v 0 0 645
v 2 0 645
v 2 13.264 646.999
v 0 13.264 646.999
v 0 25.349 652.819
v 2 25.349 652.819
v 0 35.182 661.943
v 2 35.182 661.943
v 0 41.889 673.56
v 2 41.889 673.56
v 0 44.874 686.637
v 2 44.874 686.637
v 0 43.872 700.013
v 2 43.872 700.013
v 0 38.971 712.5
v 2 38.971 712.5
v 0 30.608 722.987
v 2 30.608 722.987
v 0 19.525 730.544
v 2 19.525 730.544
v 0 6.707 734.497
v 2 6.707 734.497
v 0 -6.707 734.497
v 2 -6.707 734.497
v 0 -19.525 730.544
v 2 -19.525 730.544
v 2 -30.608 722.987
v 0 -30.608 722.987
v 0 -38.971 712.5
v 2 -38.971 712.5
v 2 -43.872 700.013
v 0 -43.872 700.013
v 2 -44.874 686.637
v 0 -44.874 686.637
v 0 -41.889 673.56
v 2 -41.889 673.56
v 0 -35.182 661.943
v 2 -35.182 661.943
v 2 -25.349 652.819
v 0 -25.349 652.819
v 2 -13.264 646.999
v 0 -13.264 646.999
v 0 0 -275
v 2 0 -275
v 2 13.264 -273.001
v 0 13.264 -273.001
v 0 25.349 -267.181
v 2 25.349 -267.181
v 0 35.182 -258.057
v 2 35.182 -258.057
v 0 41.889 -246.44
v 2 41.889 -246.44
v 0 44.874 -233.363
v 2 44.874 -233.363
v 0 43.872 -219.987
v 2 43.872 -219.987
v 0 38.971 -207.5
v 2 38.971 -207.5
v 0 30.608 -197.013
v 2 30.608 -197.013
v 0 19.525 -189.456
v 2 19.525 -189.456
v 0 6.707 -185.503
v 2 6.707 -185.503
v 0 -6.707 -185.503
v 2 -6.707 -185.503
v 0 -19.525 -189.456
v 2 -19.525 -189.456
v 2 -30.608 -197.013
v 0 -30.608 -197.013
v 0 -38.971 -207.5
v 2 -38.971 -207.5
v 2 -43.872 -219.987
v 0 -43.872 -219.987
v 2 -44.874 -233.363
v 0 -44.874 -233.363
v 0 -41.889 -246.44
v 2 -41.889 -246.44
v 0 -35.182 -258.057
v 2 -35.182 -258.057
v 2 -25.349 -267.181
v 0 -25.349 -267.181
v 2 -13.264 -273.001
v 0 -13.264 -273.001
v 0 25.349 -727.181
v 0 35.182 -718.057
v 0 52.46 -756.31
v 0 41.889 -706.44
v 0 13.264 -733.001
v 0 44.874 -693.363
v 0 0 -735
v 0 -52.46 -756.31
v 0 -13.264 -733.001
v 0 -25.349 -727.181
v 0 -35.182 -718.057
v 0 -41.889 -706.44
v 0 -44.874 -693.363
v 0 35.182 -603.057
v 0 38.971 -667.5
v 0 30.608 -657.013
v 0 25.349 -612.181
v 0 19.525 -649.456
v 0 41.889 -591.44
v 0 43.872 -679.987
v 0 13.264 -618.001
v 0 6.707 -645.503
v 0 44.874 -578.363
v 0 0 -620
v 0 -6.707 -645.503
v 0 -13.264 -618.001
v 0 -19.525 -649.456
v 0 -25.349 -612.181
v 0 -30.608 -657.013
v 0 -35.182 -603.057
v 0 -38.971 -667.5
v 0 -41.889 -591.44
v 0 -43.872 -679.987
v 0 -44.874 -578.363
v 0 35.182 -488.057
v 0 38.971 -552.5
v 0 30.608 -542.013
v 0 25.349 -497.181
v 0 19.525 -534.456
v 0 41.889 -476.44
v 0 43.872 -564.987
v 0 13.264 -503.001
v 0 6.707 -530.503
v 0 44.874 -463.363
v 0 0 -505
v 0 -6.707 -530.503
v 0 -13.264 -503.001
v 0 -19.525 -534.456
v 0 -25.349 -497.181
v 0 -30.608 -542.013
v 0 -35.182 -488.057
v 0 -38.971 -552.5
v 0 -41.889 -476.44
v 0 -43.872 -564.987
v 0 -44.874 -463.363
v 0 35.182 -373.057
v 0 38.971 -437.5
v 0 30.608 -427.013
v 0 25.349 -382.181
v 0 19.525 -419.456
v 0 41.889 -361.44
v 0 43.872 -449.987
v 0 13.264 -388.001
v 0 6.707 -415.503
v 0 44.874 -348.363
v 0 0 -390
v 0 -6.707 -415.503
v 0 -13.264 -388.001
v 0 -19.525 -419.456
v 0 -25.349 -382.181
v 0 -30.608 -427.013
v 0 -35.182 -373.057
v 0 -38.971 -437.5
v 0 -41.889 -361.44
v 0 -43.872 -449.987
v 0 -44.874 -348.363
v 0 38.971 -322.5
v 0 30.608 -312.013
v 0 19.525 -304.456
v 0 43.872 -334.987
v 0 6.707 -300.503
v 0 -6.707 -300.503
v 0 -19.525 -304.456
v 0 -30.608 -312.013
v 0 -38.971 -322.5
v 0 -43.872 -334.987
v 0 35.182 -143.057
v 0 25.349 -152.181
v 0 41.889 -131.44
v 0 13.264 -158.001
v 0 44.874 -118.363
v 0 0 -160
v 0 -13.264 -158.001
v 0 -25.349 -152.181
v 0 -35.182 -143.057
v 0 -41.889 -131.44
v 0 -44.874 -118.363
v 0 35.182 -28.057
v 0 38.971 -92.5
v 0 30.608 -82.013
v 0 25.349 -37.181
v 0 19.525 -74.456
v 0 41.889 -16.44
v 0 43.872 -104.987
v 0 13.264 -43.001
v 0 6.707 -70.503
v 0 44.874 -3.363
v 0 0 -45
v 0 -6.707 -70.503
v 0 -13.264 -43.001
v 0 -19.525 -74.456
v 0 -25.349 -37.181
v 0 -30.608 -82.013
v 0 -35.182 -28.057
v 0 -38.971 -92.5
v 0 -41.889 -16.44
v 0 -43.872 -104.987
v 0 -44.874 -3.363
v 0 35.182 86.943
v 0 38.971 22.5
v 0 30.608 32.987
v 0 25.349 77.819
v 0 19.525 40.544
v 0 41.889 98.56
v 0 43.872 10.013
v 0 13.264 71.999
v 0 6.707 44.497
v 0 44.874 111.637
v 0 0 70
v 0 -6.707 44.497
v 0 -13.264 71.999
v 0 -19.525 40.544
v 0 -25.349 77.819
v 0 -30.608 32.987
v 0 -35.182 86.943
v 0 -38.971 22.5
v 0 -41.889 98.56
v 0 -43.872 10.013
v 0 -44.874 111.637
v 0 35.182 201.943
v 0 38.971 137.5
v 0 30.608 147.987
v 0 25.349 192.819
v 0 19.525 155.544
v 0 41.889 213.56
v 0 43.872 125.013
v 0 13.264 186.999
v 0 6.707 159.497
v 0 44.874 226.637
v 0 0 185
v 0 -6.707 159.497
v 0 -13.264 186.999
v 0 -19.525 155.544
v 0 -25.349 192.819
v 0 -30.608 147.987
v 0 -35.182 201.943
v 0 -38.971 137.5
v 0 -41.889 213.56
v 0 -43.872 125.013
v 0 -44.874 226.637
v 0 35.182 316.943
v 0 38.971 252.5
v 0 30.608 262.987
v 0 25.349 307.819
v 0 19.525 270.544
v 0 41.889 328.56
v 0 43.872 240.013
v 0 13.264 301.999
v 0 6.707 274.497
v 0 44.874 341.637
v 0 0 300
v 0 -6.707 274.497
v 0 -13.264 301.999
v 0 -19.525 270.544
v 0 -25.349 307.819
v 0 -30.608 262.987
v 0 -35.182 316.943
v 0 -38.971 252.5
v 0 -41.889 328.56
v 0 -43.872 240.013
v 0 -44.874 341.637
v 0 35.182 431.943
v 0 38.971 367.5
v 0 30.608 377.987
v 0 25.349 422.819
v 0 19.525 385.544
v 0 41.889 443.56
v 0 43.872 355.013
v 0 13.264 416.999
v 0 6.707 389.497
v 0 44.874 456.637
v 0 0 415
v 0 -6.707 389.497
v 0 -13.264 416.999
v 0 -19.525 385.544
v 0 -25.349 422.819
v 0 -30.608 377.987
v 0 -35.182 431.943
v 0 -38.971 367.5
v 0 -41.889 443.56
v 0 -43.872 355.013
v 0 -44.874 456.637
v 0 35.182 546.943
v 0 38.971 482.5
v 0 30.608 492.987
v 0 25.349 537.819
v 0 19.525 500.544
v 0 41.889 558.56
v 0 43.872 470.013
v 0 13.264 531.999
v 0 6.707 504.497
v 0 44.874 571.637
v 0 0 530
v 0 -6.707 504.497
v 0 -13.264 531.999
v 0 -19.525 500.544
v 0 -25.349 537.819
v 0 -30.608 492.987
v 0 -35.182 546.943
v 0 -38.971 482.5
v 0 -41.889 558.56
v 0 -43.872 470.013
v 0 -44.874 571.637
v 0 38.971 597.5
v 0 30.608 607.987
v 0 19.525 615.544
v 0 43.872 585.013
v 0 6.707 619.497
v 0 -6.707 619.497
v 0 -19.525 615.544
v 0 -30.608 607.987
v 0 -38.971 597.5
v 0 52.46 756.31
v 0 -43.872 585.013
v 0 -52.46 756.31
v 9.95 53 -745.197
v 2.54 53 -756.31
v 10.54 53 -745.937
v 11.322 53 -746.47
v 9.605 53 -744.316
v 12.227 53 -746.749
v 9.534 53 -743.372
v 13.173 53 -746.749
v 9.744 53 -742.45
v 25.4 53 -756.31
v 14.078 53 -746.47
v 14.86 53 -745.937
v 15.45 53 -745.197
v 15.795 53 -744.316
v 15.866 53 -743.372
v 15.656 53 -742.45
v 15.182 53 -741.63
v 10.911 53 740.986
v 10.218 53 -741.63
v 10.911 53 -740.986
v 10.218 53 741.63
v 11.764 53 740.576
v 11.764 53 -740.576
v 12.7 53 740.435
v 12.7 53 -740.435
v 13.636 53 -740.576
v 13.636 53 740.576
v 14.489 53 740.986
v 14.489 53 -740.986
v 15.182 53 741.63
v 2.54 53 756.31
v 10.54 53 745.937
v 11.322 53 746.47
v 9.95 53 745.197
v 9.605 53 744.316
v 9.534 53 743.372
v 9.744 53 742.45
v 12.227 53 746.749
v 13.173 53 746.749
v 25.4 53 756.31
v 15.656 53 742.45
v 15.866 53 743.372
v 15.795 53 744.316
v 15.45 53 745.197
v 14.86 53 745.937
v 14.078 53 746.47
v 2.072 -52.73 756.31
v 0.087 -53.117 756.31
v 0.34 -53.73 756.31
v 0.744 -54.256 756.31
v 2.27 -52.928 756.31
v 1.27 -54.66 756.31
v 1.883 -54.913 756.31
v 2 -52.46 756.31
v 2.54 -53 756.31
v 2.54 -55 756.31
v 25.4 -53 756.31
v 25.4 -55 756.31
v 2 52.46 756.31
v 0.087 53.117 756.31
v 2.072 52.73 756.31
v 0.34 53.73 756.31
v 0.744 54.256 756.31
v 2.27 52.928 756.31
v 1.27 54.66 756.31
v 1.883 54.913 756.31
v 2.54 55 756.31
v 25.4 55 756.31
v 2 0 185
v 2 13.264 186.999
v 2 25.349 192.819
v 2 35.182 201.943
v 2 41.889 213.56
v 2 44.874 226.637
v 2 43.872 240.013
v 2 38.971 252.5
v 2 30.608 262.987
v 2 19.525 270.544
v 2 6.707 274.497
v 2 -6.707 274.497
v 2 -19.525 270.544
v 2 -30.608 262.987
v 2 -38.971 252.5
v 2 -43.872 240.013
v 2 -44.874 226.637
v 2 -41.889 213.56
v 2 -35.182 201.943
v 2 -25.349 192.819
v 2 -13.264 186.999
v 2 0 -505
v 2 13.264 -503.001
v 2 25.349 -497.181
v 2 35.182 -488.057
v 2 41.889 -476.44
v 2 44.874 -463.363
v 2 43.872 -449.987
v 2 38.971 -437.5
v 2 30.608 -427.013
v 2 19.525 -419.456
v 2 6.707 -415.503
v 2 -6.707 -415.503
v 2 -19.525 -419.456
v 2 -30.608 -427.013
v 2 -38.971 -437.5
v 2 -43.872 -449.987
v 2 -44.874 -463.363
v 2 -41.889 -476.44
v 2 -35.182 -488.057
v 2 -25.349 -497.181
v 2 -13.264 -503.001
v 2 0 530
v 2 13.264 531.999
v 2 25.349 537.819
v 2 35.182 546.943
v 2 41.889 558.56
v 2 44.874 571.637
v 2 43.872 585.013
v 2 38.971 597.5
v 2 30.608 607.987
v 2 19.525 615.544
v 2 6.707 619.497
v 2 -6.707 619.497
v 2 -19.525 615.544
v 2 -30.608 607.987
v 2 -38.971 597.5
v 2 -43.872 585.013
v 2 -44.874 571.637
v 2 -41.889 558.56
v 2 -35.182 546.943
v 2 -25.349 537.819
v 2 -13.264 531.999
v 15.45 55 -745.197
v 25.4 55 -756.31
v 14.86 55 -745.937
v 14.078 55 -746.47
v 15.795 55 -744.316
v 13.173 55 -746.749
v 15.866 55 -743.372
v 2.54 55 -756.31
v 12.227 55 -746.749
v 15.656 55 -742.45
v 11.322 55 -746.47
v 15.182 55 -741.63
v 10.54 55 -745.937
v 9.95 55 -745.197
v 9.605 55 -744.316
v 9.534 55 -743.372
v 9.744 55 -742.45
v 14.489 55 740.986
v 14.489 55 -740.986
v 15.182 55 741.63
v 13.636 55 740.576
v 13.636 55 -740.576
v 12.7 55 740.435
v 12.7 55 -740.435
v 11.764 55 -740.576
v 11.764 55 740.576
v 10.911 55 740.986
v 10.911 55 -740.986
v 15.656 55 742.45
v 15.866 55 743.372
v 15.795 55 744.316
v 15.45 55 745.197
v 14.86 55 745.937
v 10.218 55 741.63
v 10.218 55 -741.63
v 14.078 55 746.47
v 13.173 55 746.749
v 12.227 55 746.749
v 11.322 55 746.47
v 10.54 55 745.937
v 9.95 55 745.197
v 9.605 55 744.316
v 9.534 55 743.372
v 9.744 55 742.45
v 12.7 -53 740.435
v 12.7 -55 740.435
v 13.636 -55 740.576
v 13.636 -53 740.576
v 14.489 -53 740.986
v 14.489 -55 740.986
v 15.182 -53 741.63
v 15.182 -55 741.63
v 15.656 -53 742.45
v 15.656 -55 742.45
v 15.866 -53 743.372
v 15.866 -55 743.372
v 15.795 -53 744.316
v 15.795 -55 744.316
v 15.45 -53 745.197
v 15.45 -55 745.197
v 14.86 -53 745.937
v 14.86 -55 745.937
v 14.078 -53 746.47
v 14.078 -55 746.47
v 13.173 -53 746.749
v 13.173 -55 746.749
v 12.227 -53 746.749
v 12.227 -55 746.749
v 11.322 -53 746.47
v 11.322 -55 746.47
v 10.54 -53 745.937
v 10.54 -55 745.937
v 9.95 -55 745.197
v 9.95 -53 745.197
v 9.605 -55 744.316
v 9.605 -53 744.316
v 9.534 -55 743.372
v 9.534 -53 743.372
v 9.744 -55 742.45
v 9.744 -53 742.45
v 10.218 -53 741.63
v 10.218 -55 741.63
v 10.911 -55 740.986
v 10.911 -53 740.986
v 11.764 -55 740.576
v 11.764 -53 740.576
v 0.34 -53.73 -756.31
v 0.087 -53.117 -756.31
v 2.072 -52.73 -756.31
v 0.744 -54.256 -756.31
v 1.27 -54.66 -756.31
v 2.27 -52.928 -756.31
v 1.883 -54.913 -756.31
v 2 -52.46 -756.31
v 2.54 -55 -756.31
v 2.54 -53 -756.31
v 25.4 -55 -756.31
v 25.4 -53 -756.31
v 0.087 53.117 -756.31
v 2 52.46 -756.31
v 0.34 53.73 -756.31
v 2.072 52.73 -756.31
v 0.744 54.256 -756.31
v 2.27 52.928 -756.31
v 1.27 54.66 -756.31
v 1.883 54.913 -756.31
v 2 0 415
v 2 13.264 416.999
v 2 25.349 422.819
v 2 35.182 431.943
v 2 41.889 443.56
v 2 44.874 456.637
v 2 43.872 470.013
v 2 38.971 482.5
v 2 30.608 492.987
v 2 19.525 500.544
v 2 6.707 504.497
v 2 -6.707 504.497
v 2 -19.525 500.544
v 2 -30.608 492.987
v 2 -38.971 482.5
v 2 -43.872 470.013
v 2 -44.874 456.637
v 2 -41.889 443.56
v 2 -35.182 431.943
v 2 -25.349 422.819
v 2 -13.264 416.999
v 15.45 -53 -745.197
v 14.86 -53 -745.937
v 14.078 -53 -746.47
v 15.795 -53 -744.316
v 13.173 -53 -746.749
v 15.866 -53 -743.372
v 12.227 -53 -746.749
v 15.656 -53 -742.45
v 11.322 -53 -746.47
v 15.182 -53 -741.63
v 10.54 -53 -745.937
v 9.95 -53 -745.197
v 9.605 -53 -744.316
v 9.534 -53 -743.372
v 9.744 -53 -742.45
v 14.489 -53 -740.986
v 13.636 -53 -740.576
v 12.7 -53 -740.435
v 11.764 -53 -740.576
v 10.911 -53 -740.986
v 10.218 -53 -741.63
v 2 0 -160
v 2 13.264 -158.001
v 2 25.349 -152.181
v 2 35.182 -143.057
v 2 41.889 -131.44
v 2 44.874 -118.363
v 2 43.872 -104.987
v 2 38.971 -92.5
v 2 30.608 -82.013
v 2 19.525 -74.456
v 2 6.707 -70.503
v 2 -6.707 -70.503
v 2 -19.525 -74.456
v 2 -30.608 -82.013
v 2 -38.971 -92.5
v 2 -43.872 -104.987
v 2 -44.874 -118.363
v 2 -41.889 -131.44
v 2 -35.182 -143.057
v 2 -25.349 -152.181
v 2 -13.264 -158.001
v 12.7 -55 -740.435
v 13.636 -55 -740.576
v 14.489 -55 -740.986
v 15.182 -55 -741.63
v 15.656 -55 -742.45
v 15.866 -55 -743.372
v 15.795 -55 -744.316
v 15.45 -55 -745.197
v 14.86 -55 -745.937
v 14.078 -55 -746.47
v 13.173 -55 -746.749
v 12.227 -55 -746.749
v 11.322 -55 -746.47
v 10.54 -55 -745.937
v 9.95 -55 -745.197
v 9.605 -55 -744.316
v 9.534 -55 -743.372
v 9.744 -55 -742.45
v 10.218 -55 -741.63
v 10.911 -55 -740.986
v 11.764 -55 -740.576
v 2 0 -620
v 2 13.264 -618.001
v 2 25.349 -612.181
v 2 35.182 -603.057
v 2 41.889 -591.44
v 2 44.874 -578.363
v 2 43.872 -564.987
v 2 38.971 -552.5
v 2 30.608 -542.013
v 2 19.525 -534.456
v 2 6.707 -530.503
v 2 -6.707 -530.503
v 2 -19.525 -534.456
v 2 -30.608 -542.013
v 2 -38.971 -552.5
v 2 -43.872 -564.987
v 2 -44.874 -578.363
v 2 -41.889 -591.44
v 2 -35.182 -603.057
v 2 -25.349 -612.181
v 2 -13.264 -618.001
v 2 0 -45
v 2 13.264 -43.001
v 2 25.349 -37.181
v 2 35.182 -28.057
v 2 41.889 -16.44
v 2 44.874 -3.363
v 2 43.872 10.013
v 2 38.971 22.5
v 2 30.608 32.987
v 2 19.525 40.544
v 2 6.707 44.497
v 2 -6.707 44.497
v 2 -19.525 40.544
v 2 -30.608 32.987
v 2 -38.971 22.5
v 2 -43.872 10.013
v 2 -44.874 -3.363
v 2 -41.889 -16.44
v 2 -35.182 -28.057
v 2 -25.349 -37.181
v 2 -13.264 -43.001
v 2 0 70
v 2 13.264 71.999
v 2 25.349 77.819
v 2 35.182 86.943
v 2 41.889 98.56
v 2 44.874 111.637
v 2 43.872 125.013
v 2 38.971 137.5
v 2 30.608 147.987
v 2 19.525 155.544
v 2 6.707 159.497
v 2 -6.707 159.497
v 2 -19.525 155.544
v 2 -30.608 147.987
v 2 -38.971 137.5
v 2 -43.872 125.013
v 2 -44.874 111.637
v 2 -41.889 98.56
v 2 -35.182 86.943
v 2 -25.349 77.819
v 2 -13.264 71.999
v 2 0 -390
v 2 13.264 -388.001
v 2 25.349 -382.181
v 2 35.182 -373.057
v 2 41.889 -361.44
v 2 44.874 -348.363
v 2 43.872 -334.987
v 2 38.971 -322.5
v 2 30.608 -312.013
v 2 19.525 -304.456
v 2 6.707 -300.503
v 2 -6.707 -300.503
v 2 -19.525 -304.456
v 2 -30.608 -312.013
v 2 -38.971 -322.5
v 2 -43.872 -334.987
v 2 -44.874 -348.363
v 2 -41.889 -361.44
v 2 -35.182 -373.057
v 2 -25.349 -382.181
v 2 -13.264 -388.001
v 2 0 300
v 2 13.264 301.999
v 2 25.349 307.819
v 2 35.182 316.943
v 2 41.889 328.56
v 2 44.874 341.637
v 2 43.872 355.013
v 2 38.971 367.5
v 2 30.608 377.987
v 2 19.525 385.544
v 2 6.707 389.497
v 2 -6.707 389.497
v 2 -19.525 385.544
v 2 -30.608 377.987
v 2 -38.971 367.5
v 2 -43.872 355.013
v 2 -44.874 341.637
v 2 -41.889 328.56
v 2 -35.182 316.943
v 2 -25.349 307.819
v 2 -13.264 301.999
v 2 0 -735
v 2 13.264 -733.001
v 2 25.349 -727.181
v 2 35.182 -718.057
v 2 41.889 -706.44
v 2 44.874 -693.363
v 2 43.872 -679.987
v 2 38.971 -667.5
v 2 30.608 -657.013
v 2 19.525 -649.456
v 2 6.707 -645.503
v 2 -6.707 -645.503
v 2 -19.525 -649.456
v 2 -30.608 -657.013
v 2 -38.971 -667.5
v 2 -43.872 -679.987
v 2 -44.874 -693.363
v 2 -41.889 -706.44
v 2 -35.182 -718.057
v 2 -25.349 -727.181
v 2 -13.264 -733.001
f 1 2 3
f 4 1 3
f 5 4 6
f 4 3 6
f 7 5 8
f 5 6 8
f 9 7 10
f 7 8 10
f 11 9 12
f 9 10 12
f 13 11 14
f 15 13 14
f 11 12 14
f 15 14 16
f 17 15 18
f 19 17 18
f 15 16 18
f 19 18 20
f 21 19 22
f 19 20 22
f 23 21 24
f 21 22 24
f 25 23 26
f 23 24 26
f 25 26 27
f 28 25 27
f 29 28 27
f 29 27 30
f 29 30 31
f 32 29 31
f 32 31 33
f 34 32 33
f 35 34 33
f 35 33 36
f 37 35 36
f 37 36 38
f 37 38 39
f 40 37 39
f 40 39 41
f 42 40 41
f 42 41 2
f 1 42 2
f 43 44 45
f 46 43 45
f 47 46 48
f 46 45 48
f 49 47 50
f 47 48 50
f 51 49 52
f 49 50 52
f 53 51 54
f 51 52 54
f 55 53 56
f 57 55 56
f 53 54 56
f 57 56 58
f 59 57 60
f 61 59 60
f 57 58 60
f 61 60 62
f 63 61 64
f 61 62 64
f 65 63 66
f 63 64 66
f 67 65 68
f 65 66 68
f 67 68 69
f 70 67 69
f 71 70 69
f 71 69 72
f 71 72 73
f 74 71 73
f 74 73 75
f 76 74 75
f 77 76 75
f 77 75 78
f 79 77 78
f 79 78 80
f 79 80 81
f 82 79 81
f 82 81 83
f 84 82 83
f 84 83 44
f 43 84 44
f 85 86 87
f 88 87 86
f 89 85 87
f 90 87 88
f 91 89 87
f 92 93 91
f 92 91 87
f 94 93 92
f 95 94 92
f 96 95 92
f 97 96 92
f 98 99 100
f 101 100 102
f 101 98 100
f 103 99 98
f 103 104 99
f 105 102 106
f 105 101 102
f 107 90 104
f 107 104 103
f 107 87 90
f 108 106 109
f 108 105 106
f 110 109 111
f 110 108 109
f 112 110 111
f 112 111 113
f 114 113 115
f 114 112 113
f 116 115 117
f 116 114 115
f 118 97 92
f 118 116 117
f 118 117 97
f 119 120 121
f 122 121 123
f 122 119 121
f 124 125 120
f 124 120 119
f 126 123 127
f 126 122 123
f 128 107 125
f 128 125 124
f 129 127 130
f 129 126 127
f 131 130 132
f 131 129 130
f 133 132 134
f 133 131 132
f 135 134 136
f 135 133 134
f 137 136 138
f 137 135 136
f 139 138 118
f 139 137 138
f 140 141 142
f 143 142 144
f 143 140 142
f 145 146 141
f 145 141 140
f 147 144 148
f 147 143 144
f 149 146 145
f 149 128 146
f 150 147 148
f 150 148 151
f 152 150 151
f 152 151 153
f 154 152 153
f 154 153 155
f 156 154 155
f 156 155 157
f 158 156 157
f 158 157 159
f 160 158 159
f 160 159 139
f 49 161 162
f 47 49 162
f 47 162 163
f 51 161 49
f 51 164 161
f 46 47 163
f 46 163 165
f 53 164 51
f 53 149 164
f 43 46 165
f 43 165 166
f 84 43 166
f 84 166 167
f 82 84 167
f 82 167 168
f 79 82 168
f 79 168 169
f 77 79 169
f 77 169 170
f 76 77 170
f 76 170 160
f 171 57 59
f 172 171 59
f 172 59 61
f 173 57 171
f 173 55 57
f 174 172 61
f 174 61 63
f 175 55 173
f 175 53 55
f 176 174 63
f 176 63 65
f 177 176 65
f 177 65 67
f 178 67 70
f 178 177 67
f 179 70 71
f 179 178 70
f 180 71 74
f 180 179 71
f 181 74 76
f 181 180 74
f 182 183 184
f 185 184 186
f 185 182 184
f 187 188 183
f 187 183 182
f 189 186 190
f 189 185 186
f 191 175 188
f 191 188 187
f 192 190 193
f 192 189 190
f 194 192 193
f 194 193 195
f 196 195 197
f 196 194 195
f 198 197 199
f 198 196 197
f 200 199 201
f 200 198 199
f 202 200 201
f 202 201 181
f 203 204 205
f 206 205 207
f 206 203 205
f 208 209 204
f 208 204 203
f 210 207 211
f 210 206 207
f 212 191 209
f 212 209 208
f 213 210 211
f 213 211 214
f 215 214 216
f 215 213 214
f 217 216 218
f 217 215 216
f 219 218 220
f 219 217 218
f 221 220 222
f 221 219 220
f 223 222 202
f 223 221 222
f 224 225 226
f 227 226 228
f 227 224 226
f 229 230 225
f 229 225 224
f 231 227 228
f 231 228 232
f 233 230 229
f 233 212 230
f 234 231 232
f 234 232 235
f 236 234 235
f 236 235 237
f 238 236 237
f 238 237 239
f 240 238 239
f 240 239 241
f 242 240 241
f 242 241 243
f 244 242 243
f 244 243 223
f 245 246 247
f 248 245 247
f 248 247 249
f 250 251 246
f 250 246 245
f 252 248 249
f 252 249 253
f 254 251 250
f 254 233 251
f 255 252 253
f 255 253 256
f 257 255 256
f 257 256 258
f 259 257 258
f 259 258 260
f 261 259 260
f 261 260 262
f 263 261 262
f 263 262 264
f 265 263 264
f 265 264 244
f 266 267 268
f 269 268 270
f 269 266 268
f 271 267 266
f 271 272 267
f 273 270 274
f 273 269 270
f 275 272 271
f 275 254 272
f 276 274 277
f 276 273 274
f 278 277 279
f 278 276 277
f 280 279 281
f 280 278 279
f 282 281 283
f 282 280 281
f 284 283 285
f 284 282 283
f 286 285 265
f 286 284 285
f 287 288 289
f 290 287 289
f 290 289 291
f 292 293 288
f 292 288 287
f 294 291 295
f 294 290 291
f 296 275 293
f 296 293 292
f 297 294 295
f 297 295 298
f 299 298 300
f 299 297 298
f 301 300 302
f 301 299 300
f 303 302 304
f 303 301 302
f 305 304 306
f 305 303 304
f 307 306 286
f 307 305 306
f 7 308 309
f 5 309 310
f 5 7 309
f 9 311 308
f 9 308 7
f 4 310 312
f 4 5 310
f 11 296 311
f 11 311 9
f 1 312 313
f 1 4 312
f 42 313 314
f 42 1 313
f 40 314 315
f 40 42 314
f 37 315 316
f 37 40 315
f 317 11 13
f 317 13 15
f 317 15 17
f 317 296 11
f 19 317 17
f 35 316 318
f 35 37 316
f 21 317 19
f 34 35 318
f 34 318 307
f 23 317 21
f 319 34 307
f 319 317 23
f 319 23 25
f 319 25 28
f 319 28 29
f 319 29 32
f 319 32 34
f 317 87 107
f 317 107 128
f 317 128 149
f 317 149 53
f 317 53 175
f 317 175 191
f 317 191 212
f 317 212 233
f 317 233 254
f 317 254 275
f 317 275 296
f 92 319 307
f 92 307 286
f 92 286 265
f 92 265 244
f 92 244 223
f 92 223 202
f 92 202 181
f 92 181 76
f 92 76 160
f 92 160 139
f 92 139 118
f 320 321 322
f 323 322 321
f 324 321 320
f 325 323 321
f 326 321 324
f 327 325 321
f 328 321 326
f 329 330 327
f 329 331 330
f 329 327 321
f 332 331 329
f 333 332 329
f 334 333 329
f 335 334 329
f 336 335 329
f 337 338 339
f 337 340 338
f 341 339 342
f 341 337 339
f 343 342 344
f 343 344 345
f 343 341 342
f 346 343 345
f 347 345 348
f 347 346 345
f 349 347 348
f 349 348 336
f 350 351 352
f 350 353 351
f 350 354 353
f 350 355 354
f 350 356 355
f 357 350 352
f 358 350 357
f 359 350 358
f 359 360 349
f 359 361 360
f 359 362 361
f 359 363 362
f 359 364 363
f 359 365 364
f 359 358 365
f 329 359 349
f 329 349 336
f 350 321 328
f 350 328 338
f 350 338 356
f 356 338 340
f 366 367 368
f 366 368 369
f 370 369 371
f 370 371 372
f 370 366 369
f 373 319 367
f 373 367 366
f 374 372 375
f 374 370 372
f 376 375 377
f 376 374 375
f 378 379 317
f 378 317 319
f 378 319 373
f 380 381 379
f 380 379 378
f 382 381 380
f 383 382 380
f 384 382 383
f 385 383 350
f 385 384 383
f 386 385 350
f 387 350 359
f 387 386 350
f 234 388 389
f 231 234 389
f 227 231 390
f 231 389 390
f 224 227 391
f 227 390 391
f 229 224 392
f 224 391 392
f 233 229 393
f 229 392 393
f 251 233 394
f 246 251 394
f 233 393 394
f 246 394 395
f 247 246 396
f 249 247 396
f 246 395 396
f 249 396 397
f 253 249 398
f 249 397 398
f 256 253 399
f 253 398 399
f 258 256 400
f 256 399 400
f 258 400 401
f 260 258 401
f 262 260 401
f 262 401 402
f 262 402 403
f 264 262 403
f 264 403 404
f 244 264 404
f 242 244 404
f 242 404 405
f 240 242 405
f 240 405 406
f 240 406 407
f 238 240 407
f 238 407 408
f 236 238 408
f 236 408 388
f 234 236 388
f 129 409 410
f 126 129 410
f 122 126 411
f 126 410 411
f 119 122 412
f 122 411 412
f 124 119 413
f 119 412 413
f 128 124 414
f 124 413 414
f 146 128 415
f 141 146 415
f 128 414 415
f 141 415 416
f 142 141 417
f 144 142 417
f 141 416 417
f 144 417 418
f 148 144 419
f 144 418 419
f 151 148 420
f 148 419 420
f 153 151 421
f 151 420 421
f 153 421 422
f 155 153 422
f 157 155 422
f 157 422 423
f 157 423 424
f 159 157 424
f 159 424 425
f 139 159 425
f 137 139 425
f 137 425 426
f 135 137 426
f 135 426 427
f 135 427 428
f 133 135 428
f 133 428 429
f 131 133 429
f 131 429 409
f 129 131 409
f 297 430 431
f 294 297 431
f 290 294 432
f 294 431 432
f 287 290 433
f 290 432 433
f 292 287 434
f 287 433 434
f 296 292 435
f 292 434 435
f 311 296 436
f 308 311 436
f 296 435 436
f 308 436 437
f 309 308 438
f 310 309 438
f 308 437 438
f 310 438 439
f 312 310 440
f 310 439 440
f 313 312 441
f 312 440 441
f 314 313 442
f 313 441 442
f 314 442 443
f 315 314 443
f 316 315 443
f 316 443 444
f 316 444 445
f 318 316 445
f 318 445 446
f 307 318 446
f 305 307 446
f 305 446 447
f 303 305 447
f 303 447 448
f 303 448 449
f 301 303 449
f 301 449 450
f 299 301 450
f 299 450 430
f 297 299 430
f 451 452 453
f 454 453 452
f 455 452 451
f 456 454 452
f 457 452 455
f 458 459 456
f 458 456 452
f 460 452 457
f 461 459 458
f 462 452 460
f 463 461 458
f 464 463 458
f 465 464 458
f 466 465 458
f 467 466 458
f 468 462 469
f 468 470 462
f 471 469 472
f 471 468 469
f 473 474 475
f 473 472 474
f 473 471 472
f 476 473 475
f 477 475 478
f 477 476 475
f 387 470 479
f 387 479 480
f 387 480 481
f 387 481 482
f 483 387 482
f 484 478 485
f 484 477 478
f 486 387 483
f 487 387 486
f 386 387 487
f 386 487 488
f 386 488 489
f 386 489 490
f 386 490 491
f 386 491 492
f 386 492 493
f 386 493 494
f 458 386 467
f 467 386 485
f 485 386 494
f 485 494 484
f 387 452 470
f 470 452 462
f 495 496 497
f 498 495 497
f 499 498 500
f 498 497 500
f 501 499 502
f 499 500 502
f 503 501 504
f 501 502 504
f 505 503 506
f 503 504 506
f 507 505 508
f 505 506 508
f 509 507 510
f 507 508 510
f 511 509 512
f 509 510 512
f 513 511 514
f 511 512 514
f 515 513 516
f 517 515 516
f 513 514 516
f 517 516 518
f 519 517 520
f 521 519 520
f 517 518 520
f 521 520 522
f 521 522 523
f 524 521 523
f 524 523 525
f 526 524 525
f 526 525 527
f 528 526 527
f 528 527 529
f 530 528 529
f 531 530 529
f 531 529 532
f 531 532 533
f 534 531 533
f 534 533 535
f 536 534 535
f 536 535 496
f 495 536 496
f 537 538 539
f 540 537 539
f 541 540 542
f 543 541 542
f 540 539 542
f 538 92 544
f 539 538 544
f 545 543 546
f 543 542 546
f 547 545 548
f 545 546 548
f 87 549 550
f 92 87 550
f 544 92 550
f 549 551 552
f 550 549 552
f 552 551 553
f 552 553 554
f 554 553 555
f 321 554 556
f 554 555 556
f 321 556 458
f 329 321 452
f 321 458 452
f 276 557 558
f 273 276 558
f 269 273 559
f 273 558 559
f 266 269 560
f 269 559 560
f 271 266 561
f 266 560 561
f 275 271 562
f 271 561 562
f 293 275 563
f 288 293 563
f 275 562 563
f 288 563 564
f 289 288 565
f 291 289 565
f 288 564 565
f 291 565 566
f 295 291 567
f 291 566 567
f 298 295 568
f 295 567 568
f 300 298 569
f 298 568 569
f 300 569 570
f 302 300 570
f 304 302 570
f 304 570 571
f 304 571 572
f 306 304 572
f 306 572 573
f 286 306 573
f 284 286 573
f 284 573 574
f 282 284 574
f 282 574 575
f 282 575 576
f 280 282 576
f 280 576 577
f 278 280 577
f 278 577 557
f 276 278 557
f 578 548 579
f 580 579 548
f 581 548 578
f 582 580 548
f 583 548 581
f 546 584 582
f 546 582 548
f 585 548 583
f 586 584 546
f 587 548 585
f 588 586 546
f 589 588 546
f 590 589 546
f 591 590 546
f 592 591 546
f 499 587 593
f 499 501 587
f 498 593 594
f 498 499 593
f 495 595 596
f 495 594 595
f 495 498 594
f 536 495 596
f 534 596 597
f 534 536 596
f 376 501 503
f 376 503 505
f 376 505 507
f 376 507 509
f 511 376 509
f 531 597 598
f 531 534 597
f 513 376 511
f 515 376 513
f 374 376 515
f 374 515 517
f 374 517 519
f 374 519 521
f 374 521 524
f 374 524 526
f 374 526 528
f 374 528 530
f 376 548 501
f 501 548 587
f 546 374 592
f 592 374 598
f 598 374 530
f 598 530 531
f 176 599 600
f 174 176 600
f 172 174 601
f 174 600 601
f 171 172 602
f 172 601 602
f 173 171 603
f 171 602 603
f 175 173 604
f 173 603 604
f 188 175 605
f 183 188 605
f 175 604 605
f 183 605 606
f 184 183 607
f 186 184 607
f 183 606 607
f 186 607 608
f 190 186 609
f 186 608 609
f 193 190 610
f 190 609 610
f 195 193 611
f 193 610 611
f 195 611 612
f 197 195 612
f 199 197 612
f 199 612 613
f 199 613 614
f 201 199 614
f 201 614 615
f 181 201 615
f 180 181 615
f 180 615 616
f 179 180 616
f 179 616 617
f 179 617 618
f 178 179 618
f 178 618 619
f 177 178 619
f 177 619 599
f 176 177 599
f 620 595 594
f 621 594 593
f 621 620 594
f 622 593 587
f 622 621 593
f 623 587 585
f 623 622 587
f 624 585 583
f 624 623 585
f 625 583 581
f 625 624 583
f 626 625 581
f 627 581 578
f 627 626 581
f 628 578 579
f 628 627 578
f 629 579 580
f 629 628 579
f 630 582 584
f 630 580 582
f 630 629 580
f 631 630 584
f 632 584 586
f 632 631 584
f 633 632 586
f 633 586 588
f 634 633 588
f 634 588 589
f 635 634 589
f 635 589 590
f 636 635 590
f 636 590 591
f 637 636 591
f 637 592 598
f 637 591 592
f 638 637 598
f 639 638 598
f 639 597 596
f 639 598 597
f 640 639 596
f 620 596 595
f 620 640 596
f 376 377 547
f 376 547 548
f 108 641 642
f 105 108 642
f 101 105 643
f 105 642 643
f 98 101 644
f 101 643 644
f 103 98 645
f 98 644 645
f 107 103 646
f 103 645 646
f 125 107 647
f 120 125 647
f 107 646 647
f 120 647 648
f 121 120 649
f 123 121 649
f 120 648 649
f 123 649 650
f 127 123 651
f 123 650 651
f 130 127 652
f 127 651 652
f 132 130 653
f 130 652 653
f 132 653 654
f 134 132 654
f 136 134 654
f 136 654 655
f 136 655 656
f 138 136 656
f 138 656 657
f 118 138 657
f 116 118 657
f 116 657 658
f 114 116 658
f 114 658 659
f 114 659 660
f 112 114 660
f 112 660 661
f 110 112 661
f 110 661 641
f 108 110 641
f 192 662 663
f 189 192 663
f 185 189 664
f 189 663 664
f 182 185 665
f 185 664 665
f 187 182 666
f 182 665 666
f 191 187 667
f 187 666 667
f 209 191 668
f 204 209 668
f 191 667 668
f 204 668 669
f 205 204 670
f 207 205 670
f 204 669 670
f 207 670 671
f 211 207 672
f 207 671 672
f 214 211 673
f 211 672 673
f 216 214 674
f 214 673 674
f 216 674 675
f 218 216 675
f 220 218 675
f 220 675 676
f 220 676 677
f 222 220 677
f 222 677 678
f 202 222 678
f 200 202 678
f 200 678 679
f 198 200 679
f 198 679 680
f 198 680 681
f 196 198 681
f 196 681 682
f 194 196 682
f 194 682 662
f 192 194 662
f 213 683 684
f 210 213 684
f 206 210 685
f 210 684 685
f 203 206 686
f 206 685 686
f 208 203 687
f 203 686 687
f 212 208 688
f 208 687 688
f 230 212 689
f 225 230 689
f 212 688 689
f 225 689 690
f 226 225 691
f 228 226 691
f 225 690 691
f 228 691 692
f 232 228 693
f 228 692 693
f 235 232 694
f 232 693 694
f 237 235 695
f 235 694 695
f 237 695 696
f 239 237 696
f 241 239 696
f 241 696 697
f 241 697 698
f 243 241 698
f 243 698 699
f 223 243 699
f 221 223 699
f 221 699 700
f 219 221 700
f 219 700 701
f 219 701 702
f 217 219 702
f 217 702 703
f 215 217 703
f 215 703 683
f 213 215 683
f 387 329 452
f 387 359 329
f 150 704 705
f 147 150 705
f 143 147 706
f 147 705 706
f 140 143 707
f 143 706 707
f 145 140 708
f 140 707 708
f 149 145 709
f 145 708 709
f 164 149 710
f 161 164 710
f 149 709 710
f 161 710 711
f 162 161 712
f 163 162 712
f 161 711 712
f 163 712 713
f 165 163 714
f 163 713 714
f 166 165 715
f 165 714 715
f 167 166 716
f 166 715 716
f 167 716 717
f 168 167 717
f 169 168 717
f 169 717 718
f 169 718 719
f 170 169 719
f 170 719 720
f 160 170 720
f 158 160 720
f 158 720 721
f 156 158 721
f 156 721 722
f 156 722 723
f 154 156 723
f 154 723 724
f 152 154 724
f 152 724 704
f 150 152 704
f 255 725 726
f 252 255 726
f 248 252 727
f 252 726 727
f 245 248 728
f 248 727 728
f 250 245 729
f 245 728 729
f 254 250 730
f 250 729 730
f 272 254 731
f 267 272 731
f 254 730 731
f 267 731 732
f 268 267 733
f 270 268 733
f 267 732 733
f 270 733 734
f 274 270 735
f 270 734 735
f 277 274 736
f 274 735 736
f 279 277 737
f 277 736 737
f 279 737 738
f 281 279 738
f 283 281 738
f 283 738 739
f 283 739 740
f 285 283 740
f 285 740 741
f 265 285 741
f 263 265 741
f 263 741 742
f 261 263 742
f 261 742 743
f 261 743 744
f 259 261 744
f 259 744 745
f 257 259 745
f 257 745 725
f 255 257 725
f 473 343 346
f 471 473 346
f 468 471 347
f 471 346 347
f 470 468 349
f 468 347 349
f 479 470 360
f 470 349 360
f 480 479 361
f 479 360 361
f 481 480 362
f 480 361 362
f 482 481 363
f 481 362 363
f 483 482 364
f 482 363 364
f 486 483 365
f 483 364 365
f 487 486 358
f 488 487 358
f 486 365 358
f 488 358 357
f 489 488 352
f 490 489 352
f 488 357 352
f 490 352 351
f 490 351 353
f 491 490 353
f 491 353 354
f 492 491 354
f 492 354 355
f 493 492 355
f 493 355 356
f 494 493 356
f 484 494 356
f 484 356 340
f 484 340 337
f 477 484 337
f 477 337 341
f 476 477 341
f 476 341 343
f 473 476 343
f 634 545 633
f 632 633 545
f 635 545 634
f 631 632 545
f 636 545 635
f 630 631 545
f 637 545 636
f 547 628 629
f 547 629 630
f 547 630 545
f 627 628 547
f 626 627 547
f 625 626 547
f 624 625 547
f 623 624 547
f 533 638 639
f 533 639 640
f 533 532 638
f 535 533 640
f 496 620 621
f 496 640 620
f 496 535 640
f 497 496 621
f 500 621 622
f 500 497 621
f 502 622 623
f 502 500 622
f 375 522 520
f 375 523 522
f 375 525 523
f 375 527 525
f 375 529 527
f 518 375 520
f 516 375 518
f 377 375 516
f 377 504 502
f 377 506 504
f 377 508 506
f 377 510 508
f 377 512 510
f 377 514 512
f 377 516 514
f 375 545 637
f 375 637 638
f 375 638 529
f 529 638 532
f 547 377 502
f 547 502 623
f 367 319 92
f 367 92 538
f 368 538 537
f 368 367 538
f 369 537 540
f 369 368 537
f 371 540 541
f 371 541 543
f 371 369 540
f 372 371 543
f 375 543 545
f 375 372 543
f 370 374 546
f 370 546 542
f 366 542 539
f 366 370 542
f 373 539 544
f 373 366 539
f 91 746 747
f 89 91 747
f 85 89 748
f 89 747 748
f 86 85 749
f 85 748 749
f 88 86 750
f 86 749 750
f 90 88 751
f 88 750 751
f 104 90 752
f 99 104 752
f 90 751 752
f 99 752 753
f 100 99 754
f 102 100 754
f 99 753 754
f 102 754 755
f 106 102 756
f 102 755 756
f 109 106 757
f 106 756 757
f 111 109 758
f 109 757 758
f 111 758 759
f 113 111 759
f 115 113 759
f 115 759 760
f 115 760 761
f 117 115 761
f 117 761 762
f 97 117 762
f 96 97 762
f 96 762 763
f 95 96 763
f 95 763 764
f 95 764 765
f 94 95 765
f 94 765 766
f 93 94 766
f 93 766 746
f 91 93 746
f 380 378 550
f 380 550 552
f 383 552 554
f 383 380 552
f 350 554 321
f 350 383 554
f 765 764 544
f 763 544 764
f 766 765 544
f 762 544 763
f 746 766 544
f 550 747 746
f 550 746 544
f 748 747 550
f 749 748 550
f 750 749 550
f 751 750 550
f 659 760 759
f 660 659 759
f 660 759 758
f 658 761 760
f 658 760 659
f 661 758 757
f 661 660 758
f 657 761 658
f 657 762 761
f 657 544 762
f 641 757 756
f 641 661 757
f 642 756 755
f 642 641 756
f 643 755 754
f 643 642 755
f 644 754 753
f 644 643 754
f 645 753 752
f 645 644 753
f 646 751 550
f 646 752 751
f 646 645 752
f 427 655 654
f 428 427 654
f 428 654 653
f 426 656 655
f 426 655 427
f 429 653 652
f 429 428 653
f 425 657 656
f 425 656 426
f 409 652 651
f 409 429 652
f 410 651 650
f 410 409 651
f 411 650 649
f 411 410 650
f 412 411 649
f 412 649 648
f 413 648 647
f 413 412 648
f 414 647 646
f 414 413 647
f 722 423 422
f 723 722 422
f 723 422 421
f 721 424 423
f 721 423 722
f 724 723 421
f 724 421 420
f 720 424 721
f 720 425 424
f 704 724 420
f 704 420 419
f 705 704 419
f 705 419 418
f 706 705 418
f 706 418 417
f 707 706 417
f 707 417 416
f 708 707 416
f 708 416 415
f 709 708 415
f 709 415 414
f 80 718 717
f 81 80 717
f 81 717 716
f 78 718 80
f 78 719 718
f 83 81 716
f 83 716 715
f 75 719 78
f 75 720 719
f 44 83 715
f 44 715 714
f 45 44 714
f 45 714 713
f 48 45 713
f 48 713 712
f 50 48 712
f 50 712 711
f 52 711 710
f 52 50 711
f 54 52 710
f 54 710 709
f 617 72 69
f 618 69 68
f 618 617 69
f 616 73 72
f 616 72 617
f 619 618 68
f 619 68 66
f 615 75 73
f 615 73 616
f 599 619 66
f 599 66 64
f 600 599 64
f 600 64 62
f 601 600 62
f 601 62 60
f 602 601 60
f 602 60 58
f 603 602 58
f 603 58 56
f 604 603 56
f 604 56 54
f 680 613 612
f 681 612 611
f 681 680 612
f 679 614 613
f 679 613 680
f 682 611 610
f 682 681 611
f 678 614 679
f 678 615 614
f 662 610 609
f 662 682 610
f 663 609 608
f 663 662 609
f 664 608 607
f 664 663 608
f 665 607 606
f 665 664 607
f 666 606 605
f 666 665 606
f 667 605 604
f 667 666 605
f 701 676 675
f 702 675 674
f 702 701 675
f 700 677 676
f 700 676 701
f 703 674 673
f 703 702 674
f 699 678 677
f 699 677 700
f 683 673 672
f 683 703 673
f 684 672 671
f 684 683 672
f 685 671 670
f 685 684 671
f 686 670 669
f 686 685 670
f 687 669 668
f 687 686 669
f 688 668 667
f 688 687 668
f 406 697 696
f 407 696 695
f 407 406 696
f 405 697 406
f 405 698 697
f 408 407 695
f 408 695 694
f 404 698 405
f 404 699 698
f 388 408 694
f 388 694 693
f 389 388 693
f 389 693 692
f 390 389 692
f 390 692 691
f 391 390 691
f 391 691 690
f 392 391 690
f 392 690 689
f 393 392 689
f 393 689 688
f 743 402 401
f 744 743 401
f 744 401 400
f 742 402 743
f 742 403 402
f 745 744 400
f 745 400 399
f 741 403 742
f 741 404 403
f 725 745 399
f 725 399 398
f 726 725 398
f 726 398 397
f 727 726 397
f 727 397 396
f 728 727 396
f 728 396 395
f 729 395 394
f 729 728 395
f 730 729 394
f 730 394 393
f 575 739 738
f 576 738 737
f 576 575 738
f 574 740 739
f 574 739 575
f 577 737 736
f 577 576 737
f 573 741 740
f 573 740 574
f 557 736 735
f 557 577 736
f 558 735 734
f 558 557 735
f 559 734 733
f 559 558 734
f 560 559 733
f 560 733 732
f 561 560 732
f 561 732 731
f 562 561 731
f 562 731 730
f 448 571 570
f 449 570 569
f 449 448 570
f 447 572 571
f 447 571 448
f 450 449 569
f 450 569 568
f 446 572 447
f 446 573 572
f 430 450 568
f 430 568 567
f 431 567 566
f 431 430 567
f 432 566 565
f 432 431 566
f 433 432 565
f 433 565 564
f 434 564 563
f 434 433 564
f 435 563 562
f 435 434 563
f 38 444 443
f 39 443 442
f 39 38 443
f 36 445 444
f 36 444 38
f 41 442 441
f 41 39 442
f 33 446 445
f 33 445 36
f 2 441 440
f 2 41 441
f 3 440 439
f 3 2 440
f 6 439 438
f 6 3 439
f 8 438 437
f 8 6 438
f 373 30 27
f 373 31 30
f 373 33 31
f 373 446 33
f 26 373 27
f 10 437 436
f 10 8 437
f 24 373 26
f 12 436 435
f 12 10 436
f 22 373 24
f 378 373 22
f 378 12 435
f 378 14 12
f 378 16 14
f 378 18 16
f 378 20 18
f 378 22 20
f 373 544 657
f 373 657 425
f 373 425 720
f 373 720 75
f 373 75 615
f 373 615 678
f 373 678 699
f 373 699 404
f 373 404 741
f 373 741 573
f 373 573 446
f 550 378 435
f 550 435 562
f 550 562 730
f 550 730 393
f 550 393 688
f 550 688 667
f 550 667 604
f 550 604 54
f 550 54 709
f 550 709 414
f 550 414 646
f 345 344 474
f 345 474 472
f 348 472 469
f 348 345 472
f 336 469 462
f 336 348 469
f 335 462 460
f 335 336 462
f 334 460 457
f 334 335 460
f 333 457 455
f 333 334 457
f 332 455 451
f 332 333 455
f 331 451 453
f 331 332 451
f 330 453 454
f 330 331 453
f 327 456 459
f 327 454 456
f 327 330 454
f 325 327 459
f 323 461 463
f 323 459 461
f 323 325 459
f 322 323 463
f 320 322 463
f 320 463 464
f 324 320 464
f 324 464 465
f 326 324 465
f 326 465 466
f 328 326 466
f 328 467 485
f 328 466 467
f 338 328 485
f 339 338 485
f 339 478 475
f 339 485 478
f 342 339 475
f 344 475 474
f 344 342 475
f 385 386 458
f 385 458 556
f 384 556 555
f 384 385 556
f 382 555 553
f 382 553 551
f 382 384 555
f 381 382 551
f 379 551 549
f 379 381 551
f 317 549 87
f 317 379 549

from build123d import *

# Parameters (mm, degrees)
EXTRUDE_THIN1_DEPTH = 756.30962295
SKETCH2_R           = 45
EXTRUDE1_DEPTH      = 3
LPATTERN1_COUNT     = 7
LPATTERN1_PITCH     = 115
LPATTERN2_COUNT     = 7
LPATTERN2_PITCH     = 115
SKETCH3_R           = 3.175
EXTRUDE2_DEPTH      = 111


with BuildPart() as part:
    # Sketch1 → Extrude-Thin1 (new body, symmetric)
    with BuildSketch(Plane.XY):
        with BuildLine():
            Line((25.4, 55), (2.54, 55))
            ThreePointArc((2.54, 55), (0.743948776, 54.256051224), (0, 52.46))
            Line((0, 52.46), (0, -52.46))
            ThreePointArc((0, -52.46), (0.743948776, -54.256051224), (2.54, -55))
            Line((2.54, -55), (25.4, -55))
            Line((25.4, -55), (25.4, -53))
            Line((25.4, -53), (2.54, -53))
            ThreePointArc((2.54, -53), (2.158162338, -52.841837662), (2, -52.46))
            Line((2, -52.46), (2, 52.46))
            ThreePointArc((2, 52.46), (2.158162338, 52.841837662), (2.54, 53))
            Line((2.54, 53), (25.4, 53))
            Line((25.4, 53), (25.4, 55))
        make_face()
    extrude(amount=EXTRUDE_THIN1_DEPTH, both=True)

    # Sketch2 → Extrude1 (cut, through all)
    with BuildSketch(Plane(origin=(2, 0, 0), x_dir=(0, 0, -1), z_dir=(1, 0, 0))):
        Circle(SKETCH2_R)
    extrude1 = extrude(amount=-EXTRUDE1_DEPTH, mode=Mode.SUBTRACT)

    # LPattern1: Extrude1 ×7
    with Locations(*[(0, 0, i * LPATTERN1_PITCH) for i in range(1, LPATTERN1_COUNT)]):
        add(extrude1, mode=Mode.SUBTRACT)

    # LPattern2: Extrude1 ×7
    with Locations(*[(0, 0, -i * LPATTERN2_PITCH) for i in range(1, LPATTERN2_COUNT)]):
        add(extrude1, mode=Mode.SUBTRACT)

    # Sketch3 → Extrude2 (cut, through all)
    with BuildSketch(Plane.XZ.offset(55)):
        with Locations(Location((12.7, 743.60962295, 0), (0, 0, 270))):  # turned: the seam where the file's is
            Circle(SKETCH3_R)
    extrude2 = extrude(amount=-EXTRUDE2_DEPTH, mode=Mode.SUBTRACT)

    # Mirror1: Extrude2 across plane
    add(extrude2.mirror(Plane.XY), mode=Mode.SUBTRACT)


solid = part.part
